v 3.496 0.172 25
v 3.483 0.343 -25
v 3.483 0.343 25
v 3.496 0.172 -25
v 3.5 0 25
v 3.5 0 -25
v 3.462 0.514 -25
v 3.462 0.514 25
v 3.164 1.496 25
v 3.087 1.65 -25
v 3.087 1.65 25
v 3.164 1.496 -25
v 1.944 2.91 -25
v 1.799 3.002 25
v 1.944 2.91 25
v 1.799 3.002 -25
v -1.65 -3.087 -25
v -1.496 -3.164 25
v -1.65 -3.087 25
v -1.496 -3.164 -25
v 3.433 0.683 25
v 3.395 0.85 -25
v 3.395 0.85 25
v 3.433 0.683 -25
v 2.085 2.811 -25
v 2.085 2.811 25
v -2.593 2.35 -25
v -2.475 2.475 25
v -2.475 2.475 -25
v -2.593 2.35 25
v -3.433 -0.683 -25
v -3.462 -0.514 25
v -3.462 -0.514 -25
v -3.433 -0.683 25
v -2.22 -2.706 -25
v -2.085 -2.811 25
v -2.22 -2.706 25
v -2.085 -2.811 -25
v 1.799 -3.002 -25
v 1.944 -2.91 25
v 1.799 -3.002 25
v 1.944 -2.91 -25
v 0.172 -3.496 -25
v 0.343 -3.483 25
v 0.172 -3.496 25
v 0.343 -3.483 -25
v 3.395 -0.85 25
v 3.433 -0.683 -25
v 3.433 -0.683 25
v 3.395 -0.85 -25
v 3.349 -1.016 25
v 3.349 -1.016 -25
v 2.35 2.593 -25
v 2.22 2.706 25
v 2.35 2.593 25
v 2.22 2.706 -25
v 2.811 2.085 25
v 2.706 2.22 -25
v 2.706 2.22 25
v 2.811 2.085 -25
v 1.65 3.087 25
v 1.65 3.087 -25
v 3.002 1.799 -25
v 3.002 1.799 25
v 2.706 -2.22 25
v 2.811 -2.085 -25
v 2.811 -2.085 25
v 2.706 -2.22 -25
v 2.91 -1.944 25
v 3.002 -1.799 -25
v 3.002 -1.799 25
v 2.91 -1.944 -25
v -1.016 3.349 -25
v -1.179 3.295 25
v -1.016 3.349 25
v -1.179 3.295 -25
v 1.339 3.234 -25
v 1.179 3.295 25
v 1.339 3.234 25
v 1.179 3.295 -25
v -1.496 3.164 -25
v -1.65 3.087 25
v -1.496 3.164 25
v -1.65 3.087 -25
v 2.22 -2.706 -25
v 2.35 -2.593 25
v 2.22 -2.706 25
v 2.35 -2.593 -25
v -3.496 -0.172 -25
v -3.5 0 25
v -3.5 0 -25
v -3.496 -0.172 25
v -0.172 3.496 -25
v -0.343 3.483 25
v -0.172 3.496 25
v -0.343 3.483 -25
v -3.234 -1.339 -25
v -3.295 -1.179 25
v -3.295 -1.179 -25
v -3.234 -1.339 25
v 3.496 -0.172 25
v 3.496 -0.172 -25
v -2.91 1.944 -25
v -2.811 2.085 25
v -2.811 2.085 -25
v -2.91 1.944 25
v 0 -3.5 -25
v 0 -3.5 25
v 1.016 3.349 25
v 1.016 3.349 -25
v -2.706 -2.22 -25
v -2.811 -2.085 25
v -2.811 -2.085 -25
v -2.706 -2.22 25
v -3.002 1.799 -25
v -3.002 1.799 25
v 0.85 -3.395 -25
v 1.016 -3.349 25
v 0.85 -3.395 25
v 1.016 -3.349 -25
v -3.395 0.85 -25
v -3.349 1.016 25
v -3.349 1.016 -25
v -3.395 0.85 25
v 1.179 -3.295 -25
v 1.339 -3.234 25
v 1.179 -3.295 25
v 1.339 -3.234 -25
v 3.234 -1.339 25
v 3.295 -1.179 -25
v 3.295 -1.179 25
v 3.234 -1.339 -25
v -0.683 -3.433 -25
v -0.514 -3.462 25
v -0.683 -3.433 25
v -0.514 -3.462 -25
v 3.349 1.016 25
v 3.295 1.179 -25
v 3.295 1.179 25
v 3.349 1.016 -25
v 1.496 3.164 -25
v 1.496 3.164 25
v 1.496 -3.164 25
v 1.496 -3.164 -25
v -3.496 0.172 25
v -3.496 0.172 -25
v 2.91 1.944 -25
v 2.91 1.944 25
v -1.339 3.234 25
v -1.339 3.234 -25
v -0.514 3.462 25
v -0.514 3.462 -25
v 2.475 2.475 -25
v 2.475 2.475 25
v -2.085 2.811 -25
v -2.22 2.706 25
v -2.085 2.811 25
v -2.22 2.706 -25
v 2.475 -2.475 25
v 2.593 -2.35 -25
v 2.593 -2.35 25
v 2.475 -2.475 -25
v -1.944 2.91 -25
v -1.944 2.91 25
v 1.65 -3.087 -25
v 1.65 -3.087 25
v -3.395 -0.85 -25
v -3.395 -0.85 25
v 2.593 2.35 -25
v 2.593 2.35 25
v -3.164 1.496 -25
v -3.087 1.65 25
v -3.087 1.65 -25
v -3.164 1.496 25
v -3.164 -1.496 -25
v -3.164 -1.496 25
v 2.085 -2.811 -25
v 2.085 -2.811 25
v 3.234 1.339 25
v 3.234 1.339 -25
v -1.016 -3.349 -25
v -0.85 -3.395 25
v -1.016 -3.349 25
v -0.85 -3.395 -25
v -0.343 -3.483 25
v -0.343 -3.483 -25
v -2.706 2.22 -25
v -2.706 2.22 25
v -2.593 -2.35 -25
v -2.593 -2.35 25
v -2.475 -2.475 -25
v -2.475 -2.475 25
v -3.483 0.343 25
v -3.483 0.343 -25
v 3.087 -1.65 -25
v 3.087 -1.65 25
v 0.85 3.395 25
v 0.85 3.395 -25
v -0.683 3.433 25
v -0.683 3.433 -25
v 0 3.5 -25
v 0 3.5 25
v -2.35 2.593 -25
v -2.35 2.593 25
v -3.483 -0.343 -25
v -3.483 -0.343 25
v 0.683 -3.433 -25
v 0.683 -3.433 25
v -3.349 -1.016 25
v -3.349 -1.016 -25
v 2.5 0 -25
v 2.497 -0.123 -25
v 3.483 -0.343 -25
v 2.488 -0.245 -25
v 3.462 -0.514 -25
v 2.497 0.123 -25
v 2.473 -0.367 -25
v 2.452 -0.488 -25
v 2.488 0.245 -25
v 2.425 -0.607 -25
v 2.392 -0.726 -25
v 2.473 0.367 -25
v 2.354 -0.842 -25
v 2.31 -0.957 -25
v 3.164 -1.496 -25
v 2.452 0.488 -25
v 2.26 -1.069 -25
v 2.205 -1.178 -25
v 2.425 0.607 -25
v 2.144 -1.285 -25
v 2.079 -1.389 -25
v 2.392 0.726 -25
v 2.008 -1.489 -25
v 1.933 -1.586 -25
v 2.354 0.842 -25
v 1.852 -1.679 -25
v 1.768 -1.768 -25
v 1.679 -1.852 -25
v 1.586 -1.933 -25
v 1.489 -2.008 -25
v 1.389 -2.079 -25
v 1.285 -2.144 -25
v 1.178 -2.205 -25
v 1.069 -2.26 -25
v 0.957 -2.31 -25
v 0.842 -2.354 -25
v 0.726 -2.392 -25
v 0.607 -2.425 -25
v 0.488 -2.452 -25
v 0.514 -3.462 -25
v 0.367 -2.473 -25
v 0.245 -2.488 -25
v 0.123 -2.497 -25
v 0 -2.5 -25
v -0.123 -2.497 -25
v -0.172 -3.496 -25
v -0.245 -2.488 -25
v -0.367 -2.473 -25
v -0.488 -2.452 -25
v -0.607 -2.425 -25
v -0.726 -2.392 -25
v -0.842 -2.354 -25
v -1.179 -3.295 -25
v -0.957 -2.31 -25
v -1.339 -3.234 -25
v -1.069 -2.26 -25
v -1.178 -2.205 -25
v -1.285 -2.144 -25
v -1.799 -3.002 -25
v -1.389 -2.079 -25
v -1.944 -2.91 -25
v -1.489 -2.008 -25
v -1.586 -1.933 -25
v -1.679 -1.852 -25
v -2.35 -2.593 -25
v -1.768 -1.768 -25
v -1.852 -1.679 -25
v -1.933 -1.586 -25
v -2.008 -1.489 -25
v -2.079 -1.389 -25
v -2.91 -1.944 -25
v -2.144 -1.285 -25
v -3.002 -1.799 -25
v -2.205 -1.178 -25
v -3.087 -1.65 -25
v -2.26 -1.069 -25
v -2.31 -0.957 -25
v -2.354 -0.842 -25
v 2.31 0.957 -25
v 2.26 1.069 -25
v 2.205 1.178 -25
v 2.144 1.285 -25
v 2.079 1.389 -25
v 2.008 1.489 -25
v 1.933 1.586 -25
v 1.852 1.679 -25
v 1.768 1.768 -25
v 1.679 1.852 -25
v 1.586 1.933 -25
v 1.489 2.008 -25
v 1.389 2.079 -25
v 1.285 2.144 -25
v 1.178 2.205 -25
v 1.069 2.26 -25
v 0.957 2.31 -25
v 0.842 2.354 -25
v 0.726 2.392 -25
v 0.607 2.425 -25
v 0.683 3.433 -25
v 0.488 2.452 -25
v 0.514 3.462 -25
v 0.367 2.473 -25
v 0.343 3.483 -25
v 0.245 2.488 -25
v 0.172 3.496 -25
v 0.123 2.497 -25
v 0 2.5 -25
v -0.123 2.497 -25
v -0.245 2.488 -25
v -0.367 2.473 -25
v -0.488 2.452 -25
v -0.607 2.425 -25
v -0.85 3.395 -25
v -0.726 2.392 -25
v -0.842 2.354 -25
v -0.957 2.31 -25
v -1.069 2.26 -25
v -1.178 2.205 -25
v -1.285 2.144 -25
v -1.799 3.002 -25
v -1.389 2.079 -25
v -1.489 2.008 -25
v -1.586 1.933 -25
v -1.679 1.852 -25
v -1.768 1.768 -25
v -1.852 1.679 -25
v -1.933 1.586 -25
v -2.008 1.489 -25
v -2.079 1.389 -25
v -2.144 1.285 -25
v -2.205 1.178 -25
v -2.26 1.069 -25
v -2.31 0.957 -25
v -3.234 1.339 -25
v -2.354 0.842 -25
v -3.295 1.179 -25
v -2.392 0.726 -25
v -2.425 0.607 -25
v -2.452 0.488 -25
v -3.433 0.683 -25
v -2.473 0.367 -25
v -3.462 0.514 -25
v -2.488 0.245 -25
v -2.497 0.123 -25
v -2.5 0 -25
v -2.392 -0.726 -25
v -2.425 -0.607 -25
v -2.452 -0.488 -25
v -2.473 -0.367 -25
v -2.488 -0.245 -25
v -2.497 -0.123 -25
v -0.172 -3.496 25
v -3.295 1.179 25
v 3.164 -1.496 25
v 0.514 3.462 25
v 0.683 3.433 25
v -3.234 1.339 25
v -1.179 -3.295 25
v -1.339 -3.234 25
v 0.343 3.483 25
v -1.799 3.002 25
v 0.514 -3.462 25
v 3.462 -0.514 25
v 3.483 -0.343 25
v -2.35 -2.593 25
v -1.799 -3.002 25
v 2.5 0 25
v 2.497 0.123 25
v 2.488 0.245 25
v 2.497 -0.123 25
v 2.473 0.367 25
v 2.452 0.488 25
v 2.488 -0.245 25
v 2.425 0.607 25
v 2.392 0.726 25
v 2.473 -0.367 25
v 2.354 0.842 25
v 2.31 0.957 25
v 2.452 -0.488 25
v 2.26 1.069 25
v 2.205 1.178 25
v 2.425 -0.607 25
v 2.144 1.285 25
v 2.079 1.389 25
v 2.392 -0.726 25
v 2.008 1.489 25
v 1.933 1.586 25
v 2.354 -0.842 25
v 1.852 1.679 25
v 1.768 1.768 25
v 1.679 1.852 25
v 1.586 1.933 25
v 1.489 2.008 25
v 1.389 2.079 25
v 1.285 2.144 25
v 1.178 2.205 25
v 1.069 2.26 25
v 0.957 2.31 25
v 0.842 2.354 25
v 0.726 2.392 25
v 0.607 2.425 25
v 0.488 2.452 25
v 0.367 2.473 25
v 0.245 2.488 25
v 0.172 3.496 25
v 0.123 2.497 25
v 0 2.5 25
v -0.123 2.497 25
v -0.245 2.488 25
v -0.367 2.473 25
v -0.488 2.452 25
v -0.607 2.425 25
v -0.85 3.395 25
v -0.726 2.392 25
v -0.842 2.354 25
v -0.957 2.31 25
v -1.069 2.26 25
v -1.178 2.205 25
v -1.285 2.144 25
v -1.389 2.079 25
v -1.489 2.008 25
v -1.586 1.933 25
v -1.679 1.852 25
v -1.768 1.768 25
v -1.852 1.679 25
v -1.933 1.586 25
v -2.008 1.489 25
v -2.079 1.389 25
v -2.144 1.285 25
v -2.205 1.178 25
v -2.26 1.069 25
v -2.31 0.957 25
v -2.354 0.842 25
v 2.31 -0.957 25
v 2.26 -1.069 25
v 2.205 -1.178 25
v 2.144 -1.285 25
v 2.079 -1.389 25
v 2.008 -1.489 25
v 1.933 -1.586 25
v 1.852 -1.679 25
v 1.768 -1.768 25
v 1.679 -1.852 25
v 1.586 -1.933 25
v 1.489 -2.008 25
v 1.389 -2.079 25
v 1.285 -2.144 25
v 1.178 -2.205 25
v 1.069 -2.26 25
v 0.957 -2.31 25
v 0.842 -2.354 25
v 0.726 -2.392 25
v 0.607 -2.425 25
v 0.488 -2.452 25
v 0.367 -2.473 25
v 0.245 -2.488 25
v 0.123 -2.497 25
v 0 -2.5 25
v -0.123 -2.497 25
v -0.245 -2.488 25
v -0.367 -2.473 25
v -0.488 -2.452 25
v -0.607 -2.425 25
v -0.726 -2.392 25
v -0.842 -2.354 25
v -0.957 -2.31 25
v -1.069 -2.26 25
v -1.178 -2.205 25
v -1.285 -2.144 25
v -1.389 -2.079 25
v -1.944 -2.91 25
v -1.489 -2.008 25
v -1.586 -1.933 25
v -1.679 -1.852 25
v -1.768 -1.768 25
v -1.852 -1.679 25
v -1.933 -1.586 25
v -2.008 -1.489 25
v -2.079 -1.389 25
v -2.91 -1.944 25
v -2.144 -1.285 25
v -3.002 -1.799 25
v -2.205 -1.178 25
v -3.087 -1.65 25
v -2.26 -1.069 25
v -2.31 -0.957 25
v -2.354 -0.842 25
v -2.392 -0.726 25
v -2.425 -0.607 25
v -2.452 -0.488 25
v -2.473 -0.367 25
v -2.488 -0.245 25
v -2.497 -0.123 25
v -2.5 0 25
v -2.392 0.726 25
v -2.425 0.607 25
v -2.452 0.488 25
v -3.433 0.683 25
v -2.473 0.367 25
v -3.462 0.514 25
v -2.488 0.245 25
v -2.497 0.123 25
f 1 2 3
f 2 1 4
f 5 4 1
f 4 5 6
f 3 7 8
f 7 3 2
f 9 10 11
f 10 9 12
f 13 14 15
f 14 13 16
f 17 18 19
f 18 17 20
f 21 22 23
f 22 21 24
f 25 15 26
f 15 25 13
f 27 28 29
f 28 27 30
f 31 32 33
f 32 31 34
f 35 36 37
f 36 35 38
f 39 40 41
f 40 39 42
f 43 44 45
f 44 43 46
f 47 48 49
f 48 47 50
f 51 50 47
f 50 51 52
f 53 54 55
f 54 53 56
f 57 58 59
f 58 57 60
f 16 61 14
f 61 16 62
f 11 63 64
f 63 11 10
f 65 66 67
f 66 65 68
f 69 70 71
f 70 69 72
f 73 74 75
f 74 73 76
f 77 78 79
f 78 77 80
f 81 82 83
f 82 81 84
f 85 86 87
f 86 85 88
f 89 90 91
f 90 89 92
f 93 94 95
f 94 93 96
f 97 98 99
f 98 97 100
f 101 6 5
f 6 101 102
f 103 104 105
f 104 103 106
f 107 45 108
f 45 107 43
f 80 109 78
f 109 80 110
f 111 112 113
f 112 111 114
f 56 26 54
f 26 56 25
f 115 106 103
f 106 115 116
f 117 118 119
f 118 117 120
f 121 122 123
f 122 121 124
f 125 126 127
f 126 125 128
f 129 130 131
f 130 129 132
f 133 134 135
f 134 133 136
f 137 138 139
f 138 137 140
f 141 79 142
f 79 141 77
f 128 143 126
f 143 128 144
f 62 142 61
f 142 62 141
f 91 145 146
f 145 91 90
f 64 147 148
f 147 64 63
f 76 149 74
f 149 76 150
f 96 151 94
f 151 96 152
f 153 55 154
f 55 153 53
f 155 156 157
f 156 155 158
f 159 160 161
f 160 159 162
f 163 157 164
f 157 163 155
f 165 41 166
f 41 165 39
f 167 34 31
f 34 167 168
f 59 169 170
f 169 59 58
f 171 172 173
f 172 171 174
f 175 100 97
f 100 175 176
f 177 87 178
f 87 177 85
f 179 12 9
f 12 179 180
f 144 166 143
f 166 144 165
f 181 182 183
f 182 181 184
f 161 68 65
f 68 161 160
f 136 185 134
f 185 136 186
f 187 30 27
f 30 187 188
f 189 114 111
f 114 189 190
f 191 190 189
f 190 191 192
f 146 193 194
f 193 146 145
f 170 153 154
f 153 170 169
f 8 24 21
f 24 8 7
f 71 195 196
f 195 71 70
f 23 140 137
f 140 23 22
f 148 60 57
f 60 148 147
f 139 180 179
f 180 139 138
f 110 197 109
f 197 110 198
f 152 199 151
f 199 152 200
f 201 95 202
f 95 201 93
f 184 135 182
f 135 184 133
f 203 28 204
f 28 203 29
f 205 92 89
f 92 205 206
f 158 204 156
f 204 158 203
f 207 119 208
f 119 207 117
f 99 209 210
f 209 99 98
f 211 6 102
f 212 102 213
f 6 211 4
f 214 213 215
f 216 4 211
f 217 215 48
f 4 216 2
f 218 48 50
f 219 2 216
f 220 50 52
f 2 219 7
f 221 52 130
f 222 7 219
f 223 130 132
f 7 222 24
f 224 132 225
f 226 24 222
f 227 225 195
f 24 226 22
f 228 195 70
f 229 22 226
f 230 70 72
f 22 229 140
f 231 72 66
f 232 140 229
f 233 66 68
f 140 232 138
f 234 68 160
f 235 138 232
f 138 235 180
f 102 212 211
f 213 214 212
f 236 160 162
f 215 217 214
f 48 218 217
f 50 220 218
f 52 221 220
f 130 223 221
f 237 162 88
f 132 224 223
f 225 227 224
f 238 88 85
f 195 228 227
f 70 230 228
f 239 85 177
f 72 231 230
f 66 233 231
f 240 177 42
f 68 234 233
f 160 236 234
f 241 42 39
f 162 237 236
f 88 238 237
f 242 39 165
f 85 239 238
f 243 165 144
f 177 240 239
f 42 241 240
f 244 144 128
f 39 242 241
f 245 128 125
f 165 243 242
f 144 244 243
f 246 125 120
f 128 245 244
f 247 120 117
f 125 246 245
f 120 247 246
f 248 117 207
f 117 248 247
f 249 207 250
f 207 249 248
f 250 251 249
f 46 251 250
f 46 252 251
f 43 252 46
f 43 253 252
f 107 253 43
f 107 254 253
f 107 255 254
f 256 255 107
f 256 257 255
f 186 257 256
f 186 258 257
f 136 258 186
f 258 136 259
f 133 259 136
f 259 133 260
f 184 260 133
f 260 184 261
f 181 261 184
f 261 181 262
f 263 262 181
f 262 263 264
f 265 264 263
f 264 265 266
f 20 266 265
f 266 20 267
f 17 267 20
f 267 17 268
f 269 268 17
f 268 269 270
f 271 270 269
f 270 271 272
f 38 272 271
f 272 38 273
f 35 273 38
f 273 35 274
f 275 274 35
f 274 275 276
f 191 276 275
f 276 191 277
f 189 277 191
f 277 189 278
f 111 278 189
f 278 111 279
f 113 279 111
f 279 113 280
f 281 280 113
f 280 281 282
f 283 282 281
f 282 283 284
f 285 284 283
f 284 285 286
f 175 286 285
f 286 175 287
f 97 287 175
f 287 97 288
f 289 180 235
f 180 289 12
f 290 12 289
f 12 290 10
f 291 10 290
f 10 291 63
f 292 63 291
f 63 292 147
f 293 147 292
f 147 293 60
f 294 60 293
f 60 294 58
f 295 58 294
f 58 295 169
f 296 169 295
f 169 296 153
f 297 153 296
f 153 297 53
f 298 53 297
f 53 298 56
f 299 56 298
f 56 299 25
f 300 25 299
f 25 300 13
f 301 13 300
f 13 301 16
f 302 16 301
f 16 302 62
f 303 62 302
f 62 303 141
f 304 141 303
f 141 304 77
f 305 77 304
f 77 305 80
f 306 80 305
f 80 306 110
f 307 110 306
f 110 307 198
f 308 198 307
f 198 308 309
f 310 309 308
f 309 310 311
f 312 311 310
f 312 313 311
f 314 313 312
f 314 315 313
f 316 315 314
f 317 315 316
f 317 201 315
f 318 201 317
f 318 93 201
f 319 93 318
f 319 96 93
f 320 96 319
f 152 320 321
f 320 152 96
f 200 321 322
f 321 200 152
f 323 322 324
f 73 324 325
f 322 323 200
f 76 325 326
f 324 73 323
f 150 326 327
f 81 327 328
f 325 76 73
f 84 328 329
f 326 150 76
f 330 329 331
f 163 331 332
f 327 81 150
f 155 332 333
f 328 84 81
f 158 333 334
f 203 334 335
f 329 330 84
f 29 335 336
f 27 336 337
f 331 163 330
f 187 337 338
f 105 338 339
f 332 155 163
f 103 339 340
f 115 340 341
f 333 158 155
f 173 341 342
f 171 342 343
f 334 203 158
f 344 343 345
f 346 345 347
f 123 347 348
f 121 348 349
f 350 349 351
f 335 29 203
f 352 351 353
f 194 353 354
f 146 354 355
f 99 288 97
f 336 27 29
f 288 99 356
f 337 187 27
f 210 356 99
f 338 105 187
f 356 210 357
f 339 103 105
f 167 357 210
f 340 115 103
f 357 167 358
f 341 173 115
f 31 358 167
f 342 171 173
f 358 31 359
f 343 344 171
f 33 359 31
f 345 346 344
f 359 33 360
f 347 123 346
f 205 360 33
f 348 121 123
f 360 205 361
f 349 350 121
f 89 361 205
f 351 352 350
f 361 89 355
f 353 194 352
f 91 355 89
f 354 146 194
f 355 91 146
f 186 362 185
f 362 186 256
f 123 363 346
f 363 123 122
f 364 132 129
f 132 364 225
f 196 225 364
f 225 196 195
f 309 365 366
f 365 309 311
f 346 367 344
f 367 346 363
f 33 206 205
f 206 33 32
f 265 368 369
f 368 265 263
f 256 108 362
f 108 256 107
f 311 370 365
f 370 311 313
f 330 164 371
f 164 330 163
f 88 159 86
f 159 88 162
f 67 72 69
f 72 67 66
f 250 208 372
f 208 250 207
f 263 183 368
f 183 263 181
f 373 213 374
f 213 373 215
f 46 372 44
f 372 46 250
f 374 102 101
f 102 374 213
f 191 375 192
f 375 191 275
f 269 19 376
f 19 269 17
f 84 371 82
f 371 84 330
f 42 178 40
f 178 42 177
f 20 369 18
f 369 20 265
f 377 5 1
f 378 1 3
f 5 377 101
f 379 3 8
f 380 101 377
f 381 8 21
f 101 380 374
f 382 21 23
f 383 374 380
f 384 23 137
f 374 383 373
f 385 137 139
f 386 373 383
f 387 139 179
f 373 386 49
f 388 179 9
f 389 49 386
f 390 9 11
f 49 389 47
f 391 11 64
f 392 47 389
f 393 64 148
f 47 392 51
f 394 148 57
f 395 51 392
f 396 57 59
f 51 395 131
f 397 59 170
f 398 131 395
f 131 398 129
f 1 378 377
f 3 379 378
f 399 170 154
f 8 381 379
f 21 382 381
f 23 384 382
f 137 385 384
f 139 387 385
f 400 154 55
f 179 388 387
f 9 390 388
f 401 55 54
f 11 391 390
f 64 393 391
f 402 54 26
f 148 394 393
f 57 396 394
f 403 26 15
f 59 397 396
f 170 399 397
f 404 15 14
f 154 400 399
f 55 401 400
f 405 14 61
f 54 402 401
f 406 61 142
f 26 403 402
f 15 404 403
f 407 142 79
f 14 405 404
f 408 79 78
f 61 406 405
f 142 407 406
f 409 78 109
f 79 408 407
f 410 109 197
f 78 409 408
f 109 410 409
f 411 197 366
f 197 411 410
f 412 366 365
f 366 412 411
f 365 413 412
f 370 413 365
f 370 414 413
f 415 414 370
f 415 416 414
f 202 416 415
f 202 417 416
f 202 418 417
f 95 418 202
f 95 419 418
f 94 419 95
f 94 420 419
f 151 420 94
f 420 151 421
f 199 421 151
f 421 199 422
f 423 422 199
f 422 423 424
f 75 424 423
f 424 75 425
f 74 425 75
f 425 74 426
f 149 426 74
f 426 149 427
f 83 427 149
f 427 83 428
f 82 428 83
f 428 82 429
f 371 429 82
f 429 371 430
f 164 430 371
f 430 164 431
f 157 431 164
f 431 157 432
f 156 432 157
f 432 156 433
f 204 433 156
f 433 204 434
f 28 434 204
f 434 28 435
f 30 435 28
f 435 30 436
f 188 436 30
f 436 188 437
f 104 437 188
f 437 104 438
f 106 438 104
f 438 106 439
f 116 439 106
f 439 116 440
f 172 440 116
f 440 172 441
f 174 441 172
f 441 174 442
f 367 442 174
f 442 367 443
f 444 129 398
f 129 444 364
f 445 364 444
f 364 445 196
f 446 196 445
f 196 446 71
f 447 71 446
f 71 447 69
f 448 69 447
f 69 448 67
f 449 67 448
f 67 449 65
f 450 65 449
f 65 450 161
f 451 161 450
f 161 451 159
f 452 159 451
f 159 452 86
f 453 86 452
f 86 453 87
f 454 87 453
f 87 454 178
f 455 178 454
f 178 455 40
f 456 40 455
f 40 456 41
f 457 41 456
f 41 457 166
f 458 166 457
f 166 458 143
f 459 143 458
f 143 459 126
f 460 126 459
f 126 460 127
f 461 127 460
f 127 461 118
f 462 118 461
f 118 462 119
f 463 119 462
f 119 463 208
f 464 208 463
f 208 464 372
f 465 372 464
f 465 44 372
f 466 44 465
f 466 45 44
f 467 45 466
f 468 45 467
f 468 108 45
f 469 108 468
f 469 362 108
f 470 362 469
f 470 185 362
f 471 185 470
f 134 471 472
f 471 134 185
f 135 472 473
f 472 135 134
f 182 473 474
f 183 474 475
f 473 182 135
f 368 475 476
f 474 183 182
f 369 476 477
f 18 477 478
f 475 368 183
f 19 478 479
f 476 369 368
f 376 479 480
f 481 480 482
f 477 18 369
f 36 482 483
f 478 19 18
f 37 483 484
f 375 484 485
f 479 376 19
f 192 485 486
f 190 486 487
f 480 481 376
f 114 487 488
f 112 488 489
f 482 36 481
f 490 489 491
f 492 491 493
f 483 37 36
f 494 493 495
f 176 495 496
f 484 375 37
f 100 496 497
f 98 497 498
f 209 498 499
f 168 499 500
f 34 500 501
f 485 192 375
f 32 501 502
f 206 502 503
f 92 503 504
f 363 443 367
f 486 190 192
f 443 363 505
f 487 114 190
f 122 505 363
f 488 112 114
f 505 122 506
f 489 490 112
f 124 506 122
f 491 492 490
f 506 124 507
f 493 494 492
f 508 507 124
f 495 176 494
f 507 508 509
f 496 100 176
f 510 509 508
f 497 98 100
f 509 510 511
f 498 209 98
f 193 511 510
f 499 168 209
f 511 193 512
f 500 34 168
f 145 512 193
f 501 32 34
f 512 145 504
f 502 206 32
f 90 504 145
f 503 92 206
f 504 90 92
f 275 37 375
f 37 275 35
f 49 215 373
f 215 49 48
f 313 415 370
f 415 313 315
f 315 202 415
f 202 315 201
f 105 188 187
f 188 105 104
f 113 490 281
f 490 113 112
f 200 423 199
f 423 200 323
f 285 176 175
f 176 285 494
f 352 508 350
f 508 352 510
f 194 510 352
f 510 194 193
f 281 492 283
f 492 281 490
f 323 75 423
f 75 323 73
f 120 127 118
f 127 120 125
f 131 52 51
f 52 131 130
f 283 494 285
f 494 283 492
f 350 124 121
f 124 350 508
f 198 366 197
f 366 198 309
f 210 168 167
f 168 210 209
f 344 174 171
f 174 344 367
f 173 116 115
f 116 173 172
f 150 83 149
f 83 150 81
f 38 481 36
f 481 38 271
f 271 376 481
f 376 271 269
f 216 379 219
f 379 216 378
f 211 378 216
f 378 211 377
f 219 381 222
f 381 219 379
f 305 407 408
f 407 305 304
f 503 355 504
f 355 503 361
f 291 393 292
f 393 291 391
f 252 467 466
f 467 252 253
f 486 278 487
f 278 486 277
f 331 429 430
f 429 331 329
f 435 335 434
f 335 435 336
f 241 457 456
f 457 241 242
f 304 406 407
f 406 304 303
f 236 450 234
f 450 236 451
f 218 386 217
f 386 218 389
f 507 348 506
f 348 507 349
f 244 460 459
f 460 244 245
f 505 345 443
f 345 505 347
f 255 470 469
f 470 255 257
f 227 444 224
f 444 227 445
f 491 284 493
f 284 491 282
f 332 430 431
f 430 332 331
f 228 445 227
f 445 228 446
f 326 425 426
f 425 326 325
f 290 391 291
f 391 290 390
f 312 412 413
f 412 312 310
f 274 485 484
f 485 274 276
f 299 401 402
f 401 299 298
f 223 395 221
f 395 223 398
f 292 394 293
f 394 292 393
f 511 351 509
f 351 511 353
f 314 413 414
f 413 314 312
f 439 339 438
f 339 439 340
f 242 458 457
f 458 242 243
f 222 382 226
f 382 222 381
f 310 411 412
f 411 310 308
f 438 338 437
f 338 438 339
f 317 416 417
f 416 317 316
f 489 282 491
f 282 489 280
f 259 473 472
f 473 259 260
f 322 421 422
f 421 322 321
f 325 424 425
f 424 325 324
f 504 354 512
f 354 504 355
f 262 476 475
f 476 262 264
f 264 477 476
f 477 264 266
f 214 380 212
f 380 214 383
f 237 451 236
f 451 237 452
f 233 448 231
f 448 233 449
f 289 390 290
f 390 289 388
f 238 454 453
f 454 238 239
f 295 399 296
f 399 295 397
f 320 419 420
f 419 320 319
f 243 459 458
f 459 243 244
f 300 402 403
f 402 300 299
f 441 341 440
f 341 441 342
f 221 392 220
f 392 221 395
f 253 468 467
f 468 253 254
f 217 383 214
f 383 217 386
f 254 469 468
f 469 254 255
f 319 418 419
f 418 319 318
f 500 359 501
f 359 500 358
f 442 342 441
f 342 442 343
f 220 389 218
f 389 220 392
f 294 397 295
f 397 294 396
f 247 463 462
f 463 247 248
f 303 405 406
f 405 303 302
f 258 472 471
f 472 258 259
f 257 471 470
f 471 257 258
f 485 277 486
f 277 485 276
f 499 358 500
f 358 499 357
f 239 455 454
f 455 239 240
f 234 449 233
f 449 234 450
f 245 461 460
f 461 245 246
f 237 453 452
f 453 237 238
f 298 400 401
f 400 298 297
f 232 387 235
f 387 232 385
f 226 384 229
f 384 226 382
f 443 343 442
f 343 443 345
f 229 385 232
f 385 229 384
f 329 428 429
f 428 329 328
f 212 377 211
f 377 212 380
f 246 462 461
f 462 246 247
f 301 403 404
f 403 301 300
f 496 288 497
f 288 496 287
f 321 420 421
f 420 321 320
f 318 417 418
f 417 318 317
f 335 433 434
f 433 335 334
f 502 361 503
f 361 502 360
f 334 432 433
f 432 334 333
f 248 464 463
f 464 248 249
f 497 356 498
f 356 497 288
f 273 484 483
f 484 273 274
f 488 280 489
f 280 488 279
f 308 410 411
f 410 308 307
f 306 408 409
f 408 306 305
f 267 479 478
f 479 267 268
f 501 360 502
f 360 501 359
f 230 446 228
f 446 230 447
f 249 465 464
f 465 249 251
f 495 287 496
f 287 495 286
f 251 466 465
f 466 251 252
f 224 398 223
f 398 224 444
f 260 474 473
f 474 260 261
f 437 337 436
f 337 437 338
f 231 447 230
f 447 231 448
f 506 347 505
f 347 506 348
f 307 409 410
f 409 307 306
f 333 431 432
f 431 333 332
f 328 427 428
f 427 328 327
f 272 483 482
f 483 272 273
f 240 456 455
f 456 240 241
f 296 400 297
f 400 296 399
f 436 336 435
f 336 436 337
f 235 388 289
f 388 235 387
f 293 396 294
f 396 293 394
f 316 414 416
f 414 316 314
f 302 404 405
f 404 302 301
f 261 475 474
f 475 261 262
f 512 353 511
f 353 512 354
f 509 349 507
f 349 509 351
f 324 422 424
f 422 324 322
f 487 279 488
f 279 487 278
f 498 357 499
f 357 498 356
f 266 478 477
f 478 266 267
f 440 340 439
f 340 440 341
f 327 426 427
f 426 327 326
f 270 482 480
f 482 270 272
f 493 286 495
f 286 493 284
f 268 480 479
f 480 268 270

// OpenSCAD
// PTFE heatshrink sleeving tubing (hollow tube)
// Fixes: ensure visible geometry, smooth cylinder, PTFE-like semi-translucent white

$fa = 3;          // finer angular resolution
$fs = 0.25;       // finer segment length
$fn = 128;        // high radial resolution for smooth cross-section

inner_diameter = 5;   // mm
outer_diameter = 7;   // mm
length = 50;          // mm
centered = true;

// Create a hollow cylindrical tube
module tubing_segment(inner_d, outer_d, len, centered=true) {
    // Robustness: ensure valid wall thickness
    inner_d2 = min(inner_d, outer_d - 0.2);

    difference() {
        cylinder(d=outer_d, h=len, center=centered);
        // Slightly longer inner cut to guarantee clean subtraction
        cylinder(d=inner_d2, h=len + 0.4, center=centered);
    }
}

// PTFE-like appearance (semi-translucent white)
color([0.97, 0.97, 0.98, 0.45])
    tubing_segment(inner_diameter, outer_diameter, length, centered);
